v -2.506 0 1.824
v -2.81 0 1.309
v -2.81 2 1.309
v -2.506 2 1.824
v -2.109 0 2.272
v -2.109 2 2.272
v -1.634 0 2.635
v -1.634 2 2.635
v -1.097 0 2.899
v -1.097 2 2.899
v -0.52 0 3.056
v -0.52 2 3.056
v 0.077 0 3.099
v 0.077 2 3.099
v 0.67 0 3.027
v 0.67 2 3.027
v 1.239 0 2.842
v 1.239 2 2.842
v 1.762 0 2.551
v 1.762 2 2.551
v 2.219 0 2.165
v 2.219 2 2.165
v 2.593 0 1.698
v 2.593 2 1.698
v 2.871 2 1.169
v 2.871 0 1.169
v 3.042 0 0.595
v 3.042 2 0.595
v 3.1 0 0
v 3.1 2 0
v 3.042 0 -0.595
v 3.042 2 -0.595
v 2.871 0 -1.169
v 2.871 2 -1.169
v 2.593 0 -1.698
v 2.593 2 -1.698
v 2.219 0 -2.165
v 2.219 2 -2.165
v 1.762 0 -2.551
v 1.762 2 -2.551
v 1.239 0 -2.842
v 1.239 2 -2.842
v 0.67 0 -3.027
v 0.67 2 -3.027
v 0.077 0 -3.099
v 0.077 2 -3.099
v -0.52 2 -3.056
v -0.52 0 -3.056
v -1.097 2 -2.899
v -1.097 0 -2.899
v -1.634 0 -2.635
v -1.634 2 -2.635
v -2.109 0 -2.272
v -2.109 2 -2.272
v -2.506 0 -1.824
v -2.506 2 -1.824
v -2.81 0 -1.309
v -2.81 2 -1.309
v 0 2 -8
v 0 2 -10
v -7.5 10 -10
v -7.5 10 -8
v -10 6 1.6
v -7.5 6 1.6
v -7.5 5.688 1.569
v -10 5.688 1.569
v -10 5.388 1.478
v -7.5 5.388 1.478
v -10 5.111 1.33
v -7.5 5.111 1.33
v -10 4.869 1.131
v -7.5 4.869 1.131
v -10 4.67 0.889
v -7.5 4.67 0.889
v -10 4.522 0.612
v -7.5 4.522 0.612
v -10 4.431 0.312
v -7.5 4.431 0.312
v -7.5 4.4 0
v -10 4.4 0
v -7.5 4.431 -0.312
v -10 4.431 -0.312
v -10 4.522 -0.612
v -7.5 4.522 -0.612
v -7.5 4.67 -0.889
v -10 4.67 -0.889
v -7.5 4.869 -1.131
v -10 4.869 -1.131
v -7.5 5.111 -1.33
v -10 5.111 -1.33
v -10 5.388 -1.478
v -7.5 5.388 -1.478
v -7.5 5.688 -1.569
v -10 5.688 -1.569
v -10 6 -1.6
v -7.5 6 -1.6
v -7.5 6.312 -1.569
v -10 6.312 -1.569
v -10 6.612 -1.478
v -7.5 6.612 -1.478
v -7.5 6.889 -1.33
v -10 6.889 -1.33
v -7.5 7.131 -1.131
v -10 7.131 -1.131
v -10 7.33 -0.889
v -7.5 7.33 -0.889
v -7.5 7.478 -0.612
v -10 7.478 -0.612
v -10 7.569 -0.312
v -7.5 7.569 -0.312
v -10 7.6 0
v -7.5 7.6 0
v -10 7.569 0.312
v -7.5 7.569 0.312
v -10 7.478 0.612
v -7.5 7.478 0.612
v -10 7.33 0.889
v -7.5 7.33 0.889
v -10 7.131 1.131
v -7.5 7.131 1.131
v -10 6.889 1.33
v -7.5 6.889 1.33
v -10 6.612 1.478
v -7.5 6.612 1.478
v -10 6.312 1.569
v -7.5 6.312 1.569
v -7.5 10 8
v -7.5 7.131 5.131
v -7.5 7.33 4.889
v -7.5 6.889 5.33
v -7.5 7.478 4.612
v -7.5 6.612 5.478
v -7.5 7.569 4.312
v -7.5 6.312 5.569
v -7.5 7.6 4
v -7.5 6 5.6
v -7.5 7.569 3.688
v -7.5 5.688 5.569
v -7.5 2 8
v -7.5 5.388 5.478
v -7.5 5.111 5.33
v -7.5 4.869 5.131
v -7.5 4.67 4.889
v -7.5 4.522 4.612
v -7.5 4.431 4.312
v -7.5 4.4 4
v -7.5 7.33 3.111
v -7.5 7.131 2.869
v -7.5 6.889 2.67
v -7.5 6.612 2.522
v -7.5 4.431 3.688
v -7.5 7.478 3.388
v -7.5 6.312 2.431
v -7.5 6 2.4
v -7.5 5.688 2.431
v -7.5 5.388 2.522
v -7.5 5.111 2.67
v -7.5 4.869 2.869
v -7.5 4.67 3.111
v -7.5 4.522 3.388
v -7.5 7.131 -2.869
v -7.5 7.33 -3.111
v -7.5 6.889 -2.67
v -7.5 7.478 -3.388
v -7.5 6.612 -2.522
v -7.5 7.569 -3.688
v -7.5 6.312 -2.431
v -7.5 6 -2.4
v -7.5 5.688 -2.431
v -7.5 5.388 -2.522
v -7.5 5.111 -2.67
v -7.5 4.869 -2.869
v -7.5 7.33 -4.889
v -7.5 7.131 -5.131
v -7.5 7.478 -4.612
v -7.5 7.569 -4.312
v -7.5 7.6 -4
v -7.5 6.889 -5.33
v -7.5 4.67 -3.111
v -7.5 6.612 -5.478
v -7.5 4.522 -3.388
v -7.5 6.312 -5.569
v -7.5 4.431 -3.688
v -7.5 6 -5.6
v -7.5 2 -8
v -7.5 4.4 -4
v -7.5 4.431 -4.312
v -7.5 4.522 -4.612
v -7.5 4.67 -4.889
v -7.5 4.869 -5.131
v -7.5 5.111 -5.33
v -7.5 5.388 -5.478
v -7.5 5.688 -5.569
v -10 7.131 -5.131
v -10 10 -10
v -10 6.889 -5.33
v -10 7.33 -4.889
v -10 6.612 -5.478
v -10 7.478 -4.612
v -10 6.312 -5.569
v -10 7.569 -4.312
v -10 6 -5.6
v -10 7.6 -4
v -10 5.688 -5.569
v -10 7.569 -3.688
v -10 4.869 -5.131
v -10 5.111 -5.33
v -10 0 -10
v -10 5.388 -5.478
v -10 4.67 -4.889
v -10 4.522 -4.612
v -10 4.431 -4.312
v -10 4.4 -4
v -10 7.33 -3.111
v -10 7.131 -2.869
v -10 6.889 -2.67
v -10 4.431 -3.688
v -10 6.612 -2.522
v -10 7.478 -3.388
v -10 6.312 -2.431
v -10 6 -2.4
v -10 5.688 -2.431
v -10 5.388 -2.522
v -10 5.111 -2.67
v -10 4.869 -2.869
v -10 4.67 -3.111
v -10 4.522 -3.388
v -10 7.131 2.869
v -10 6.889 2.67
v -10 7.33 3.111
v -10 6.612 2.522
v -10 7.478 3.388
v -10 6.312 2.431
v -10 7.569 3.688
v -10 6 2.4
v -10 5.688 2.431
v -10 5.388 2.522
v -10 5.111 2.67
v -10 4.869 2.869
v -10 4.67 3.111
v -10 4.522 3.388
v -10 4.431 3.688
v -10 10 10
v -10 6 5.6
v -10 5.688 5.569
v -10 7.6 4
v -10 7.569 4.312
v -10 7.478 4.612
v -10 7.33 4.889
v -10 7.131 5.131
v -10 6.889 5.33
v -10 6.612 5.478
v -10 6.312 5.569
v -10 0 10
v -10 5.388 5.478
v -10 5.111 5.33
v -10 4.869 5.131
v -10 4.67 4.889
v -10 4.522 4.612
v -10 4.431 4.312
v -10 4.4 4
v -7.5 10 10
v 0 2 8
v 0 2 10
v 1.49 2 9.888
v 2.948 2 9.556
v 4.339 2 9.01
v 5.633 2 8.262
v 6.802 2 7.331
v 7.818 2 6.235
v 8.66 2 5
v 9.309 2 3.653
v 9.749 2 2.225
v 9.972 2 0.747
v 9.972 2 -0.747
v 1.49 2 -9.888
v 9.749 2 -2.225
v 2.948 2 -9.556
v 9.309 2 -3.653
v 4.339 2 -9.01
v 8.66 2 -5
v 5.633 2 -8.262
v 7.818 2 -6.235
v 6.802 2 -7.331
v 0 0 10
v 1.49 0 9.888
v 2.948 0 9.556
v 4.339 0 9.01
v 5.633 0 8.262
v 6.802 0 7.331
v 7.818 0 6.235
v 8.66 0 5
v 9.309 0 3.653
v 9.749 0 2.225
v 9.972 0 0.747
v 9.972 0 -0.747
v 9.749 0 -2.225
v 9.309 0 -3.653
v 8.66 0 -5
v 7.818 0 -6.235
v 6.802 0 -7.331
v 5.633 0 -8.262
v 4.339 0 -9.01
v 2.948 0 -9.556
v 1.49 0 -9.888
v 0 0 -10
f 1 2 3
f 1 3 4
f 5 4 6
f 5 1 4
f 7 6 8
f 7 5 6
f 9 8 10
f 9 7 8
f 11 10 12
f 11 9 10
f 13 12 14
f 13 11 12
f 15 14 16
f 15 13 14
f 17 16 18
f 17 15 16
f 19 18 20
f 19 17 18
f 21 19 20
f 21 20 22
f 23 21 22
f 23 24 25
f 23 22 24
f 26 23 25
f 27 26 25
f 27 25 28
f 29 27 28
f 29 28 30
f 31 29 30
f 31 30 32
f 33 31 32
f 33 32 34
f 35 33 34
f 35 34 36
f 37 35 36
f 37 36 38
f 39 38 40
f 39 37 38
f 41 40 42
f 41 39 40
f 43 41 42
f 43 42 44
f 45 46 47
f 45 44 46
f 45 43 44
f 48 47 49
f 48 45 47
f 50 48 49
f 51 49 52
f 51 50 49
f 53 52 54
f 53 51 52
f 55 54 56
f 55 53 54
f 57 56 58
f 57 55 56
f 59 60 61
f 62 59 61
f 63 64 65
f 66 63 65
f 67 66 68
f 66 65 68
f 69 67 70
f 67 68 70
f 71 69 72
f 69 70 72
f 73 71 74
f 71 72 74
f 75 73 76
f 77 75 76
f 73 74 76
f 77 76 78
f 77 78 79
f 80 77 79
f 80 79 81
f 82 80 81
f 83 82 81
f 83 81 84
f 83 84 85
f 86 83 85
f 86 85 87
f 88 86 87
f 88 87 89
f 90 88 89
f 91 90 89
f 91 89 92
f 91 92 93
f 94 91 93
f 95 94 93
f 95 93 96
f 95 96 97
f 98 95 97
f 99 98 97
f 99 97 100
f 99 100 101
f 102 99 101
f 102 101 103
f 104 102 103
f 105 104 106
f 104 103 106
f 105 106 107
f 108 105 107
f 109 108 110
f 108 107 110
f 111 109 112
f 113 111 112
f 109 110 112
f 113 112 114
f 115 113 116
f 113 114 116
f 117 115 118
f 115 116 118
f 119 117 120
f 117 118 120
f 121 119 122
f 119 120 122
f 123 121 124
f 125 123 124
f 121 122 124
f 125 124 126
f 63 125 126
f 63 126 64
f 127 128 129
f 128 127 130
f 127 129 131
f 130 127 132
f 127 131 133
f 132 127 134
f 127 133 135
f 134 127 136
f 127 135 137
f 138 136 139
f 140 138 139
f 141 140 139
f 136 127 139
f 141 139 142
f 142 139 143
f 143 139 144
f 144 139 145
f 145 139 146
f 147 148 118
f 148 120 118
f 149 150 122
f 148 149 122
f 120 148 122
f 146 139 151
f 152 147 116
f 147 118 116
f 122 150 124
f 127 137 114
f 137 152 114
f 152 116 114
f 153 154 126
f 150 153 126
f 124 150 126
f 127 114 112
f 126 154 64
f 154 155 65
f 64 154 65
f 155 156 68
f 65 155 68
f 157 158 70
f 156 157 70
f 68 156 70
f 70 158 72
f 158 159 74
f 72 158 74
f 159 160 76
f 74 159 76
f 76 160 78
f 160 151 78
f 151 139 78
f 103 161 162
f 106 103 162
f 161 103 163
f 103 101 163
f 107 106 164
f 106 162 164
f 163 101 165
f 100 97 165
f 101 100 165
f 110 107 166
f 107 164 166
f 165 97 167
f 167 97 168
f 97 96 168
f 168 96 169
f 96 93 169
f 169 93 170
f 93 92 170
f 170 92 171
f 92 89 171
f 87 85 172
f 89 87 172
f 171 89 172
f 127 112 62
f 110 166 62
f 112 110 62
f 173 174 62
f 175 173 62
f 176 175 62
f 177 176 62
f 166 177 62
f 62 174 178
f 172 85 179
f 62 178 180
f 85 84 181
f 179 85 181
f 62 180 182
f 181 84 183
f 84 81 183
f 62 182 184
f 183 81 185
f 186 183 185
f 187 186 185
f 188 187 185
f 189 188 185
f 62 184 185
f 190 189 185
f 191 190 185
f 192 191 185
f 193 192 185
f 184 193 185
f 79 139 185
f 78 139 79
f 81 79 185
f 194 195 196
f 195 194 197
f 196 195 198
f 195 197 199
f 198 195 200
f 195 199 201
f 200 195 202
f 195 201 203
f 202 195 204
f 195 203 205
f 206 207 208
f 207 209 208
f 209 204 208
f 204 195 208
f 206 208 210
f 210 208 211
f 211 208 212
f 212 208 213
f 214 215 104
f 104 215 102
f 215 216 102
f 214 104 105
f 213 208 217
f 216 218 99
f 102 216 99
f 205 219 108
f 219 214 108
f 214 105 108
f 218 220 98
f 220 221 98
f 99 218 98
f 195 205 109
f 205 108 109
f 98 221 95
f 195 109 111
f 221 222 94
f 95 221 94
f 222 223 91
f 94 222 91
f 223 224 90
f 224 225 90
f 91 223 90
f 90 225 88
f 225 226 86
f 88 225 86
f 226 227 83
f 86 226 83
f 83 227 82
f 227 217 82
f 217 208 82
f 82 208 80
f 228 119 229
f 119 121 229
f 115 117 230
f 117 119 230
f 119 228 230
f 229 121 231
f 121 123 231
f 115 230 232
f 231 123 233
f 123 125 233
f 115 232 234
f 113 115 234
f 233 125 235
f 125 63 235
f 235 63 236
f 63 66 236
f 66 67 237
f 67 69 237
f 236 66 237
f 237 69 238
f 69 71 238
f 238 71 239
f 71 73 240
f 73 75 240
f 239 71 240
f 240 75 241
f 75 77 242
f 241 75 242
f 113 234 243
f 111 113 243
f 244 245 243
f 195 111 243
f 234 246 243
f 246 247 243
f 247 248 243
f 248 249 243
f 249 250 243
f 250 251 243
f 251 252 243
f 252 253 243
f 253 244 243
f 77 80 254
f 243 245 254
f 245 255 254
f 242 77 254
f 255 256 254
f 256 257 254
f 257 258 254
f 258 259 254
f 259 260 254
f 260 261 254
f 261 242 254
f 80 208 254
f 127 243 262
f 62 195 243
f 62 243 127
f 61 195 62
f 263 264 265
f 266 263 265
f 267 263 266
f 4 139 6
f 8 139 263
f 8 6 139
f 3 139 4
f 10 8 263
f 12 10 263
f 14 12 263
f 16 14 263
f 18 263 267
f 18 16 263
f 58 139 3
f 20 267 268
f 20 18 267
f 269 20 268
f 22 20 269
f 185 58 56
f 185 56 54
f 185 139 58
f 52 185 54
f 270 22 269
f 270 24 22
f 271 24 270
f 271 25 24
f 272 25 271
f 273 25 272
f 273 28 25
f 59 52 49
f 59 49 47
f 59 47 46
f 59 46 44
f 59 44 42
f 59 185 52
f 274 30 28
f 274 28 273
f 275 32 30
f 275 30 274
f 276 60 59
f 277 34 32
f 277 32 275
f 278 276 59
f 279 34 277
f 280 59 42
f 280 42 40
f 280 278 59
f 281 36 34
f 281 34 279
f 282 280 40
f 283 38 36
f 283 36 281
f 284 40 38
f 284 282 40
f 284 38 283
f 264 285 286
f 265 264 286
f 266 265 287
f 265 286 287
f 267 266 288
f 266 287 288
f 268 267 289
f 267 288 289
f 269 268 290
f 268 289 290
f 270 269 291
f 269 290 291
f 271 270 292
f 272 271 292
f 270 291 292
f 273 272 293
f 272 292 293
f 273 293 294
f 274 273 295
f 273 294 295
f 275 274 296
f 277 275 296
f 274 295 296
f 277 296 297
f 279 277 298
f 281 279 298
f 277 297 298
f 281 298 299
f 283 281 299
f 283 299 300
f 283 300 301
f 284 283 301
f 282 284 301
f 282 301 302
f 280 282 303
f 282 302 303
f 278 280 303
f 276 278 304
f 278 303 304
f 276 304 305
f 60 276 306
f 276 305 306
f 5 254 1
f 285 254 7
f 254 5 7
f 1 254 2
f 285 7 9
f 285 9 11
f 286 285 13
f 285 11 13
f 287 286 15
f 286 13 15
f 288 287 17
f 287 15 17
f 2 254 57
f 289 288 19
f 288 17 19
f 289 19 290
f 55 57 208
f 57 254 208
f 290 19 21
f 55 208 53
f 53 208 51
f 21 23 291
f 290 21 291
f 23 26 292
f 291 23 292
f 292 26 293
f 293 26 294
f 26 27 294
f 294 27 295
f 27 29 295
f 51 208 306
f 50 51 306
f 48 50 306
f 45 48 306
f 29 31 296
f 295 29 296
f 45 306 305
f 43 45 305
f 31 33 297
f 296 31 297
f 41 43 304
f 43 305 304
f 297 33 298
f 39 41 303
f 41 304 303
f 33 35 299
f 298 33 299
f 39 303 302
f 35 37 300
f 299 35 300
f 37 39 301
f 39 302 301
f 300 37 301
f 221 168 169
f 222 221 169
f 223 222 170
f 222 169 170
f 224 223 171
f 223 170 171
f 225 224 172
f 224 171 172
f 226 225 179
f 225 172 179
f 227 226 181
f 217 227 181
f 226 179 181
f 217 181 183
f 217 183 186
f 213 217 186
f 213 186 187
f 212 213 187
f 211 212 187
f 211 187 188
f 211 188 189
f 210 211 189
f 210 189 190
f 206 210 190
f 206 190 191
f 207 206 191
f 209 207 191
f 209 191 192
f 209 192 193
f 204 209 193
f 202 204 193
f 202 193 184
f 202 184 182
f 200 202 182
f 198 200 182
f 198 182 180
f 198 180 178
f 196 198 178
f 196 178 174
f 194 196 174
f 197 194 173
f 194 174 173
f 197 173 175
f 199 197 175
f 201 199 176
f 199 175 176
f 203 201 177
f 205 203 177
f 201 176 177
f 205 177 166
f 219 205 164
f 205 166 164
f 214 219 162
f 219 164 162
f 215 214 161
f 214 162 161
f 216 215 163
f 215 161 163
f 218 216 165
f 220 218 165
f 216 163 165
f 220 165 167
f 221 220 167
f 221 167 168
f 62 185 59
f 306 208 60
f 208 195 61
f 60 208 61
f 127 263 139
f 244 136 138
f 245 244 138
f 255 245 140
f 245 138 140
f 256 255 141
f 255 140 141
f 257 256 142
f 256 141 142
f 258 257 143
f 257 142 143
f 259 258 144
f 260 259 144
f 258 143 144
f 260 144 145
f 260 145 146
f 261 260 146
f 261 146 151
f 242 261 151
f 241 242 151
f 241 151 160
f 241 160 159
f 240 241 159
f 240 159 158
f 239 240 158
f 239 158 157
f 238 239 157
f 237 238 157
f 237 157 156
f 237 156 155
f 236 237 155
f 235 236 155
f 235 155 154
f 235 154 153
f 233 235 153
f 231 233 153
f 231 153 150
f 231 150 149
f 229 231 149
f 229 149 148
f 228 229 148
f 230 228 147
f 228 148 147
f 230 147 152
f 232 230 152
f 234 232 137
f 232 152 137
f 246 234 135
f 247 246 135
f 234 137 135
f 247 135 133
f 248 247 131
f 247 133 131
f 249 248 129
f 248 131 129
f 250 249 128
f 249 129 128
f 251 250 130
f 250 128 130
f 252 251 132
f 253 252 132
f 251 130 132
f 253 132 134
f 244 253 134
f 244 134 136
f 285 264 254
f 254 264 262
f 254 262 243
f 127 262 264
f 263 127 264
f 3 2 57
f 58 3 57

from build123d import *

# Parameters (mm, degrees)
SKETCH1_R           = 3.1
BOSS_EXTRUDE1_DEPTH = 2
BOSS_EXTRUDE2_DEPTH = 10
BOSS_EXTRUDE3_DEPTH = 2
BOSS_EXTRUDE4_DEPTH = 2
CUT_EXTRUDE1_DEPTH  = 5
BOSS_EXTRUDE5_START = -2
BOSS_EXTRUDE5_DEPTH = 2


with BuildPart() as part:
    # Sketch1 → Boss-Extrude1 (new body)
    with BuildSketch(Plane(origin=(0, 0, 0), x_dir=(1, 0, 0), z_dir=(0, 1, 0))):
        with BuildLine():
            ThreePointArc((0, -10), (10, 0), (0, 10))
            Line((0, 10), (-10, 10))
            Line((-10, 10), (-10, -10))
            Line((-10, -10), (0, -10))
        make_face()
        with Locations(Location((0, 0, 0), (0, 0, 270))):
            Circle(SKETCH1_R, mode=Mode.SUBTRACT)
    extrude(amount=BOSS_EXTRUDE1_DEPTH)

    # Sketch1<3> → Boss-Extrude2 (add)
    with BuildSketch(Plane(origin=(0, 0, 0), x_dir=(1, 0, 0), z_dir=(0, 1, 0))):
        with BuildLine():
            Line((-7.5, -6.614378278), (-7.5, 6.614378278))
            ThreePointArc((-7.5, 6.614378278), (-9.354143467, 3.535533906), (-10, 0))
            ThreePointArc((-10, 0), (-9.354143467, -3.535533906), (-7.5, -6.614378278))
        make_face()
        with BuildLine():
            Line((-7.5, 6.614378278), (-7.5, 10))
            Line((-7.5, 10), (-10, 10))
            Line((-10, 10), (-10, 0))
            ThreePointArc((-10, 0), (-9.354143467, 3.535533906), (-7.5, 6.614378278))
        make_face()
        with BuildLine():
            Line((-7.5, -10), (-7.5, -6.614378278))
            ThreePointArc((-7.5, -6.614378278), (-9.354143467, -3.535533906), (-10, 0))
            Line((-10, 0), (-10, -10))
            Line((-10, -10), (-7.5, -10))
        make_face()
    extrude(amount=BOSS_EXTRUDE2_DEPTH)

    # Sketch2 → Boss-Extrude3 (add)
    with BuildSketch(Plane.XY.offset(10)):
        Polygon((-7.5, 10), (0, 2), (-7.5, 2), align=None)
    extrude(amount=-BOSS_EXTRUDE3_DEPTH)

    # Sketch3 → Boss-Extrude4 (add)
    with BuildSketch(Plane(origin=(0, 0, -10), x_dir=(-1, 0, 0), z_dir=(0, 0, -1))):
        Polygon((0, 2), (7.5, 10), (7.5, 2), align=None)
    extrude(amount=-BOSS_EXTRUDE4_DEPTH)

    # Sketch4 → Cut-Extrude1 (cut)
    with BuildSketch(Plane(origin=(-7.5, 0, 0), x_dir=(0, 0, -1), z_dir=(1, 0, 0))):
        with BuildLine():
            ThreePointArc((-2.4, 6), (-4, 7.6), (-5.6, 6))
            Line((-5.6, 6), (-2.4, 6))
        make_face()
        with BuildLine():
            Line((-2.4, 6), (-5.6, 6))
            ThreePointArc((-5.6, 6), (-4, 4.4), (-2.4, 6))
        make_face()
        with BuildLine():
            ThreePointArc((1.6, 6), (0, 7.6), (-1.6, 6))
            Line((-1.6, 6), (0, 6))
            Line((0, 6), (1.6, 6))
        make_face()
        with BuildLine():
            Line((0, 6), (-1.6, 6))
            ThreePointArc((-1.6, 6), (0, 4.4), (1.6, 6))
            Line((1.6, 6), (0, 6))
        make_face()
        with BuildLine():
            ThreePointArc((5.6, 6), (4, 7.6), (2.4, 6))
            Line((2.4, 6), (5.6, 6))
        make_face()
        with BuildLine():
            Line((5.6, 6), (2.4, 6))
            ThreePointArc((2.4, 6), (4, 4.4), (5.6, 6))
        make_face()
    extrude(amount=-CUT_EXTRUDE1_DEPTH, mode=Mode.SUBTRACT)

    # Sketch5 → Boss-Extrude5 (add)
    with BuildSketch(Plane(origin=(0, 2, 0), x_dir=(1, 0, 0), z_dir=(0, 1, 0)).offset(BOSS_EXTRUDE5_START)):
        with BuildLine():
            Line((-2.81, -1.309160036), (-2.81, 0))
            Line((-2.81, 0), (-2.81, 1.309160036))
            ThreePointArc((-2.81, 1.309160036), (-3.1, 0), (-2.81, -1.309160036))
        make_face()
    extrude(amount=BOSS_EXTRUDE5_DEPTH)


solid = part.part
